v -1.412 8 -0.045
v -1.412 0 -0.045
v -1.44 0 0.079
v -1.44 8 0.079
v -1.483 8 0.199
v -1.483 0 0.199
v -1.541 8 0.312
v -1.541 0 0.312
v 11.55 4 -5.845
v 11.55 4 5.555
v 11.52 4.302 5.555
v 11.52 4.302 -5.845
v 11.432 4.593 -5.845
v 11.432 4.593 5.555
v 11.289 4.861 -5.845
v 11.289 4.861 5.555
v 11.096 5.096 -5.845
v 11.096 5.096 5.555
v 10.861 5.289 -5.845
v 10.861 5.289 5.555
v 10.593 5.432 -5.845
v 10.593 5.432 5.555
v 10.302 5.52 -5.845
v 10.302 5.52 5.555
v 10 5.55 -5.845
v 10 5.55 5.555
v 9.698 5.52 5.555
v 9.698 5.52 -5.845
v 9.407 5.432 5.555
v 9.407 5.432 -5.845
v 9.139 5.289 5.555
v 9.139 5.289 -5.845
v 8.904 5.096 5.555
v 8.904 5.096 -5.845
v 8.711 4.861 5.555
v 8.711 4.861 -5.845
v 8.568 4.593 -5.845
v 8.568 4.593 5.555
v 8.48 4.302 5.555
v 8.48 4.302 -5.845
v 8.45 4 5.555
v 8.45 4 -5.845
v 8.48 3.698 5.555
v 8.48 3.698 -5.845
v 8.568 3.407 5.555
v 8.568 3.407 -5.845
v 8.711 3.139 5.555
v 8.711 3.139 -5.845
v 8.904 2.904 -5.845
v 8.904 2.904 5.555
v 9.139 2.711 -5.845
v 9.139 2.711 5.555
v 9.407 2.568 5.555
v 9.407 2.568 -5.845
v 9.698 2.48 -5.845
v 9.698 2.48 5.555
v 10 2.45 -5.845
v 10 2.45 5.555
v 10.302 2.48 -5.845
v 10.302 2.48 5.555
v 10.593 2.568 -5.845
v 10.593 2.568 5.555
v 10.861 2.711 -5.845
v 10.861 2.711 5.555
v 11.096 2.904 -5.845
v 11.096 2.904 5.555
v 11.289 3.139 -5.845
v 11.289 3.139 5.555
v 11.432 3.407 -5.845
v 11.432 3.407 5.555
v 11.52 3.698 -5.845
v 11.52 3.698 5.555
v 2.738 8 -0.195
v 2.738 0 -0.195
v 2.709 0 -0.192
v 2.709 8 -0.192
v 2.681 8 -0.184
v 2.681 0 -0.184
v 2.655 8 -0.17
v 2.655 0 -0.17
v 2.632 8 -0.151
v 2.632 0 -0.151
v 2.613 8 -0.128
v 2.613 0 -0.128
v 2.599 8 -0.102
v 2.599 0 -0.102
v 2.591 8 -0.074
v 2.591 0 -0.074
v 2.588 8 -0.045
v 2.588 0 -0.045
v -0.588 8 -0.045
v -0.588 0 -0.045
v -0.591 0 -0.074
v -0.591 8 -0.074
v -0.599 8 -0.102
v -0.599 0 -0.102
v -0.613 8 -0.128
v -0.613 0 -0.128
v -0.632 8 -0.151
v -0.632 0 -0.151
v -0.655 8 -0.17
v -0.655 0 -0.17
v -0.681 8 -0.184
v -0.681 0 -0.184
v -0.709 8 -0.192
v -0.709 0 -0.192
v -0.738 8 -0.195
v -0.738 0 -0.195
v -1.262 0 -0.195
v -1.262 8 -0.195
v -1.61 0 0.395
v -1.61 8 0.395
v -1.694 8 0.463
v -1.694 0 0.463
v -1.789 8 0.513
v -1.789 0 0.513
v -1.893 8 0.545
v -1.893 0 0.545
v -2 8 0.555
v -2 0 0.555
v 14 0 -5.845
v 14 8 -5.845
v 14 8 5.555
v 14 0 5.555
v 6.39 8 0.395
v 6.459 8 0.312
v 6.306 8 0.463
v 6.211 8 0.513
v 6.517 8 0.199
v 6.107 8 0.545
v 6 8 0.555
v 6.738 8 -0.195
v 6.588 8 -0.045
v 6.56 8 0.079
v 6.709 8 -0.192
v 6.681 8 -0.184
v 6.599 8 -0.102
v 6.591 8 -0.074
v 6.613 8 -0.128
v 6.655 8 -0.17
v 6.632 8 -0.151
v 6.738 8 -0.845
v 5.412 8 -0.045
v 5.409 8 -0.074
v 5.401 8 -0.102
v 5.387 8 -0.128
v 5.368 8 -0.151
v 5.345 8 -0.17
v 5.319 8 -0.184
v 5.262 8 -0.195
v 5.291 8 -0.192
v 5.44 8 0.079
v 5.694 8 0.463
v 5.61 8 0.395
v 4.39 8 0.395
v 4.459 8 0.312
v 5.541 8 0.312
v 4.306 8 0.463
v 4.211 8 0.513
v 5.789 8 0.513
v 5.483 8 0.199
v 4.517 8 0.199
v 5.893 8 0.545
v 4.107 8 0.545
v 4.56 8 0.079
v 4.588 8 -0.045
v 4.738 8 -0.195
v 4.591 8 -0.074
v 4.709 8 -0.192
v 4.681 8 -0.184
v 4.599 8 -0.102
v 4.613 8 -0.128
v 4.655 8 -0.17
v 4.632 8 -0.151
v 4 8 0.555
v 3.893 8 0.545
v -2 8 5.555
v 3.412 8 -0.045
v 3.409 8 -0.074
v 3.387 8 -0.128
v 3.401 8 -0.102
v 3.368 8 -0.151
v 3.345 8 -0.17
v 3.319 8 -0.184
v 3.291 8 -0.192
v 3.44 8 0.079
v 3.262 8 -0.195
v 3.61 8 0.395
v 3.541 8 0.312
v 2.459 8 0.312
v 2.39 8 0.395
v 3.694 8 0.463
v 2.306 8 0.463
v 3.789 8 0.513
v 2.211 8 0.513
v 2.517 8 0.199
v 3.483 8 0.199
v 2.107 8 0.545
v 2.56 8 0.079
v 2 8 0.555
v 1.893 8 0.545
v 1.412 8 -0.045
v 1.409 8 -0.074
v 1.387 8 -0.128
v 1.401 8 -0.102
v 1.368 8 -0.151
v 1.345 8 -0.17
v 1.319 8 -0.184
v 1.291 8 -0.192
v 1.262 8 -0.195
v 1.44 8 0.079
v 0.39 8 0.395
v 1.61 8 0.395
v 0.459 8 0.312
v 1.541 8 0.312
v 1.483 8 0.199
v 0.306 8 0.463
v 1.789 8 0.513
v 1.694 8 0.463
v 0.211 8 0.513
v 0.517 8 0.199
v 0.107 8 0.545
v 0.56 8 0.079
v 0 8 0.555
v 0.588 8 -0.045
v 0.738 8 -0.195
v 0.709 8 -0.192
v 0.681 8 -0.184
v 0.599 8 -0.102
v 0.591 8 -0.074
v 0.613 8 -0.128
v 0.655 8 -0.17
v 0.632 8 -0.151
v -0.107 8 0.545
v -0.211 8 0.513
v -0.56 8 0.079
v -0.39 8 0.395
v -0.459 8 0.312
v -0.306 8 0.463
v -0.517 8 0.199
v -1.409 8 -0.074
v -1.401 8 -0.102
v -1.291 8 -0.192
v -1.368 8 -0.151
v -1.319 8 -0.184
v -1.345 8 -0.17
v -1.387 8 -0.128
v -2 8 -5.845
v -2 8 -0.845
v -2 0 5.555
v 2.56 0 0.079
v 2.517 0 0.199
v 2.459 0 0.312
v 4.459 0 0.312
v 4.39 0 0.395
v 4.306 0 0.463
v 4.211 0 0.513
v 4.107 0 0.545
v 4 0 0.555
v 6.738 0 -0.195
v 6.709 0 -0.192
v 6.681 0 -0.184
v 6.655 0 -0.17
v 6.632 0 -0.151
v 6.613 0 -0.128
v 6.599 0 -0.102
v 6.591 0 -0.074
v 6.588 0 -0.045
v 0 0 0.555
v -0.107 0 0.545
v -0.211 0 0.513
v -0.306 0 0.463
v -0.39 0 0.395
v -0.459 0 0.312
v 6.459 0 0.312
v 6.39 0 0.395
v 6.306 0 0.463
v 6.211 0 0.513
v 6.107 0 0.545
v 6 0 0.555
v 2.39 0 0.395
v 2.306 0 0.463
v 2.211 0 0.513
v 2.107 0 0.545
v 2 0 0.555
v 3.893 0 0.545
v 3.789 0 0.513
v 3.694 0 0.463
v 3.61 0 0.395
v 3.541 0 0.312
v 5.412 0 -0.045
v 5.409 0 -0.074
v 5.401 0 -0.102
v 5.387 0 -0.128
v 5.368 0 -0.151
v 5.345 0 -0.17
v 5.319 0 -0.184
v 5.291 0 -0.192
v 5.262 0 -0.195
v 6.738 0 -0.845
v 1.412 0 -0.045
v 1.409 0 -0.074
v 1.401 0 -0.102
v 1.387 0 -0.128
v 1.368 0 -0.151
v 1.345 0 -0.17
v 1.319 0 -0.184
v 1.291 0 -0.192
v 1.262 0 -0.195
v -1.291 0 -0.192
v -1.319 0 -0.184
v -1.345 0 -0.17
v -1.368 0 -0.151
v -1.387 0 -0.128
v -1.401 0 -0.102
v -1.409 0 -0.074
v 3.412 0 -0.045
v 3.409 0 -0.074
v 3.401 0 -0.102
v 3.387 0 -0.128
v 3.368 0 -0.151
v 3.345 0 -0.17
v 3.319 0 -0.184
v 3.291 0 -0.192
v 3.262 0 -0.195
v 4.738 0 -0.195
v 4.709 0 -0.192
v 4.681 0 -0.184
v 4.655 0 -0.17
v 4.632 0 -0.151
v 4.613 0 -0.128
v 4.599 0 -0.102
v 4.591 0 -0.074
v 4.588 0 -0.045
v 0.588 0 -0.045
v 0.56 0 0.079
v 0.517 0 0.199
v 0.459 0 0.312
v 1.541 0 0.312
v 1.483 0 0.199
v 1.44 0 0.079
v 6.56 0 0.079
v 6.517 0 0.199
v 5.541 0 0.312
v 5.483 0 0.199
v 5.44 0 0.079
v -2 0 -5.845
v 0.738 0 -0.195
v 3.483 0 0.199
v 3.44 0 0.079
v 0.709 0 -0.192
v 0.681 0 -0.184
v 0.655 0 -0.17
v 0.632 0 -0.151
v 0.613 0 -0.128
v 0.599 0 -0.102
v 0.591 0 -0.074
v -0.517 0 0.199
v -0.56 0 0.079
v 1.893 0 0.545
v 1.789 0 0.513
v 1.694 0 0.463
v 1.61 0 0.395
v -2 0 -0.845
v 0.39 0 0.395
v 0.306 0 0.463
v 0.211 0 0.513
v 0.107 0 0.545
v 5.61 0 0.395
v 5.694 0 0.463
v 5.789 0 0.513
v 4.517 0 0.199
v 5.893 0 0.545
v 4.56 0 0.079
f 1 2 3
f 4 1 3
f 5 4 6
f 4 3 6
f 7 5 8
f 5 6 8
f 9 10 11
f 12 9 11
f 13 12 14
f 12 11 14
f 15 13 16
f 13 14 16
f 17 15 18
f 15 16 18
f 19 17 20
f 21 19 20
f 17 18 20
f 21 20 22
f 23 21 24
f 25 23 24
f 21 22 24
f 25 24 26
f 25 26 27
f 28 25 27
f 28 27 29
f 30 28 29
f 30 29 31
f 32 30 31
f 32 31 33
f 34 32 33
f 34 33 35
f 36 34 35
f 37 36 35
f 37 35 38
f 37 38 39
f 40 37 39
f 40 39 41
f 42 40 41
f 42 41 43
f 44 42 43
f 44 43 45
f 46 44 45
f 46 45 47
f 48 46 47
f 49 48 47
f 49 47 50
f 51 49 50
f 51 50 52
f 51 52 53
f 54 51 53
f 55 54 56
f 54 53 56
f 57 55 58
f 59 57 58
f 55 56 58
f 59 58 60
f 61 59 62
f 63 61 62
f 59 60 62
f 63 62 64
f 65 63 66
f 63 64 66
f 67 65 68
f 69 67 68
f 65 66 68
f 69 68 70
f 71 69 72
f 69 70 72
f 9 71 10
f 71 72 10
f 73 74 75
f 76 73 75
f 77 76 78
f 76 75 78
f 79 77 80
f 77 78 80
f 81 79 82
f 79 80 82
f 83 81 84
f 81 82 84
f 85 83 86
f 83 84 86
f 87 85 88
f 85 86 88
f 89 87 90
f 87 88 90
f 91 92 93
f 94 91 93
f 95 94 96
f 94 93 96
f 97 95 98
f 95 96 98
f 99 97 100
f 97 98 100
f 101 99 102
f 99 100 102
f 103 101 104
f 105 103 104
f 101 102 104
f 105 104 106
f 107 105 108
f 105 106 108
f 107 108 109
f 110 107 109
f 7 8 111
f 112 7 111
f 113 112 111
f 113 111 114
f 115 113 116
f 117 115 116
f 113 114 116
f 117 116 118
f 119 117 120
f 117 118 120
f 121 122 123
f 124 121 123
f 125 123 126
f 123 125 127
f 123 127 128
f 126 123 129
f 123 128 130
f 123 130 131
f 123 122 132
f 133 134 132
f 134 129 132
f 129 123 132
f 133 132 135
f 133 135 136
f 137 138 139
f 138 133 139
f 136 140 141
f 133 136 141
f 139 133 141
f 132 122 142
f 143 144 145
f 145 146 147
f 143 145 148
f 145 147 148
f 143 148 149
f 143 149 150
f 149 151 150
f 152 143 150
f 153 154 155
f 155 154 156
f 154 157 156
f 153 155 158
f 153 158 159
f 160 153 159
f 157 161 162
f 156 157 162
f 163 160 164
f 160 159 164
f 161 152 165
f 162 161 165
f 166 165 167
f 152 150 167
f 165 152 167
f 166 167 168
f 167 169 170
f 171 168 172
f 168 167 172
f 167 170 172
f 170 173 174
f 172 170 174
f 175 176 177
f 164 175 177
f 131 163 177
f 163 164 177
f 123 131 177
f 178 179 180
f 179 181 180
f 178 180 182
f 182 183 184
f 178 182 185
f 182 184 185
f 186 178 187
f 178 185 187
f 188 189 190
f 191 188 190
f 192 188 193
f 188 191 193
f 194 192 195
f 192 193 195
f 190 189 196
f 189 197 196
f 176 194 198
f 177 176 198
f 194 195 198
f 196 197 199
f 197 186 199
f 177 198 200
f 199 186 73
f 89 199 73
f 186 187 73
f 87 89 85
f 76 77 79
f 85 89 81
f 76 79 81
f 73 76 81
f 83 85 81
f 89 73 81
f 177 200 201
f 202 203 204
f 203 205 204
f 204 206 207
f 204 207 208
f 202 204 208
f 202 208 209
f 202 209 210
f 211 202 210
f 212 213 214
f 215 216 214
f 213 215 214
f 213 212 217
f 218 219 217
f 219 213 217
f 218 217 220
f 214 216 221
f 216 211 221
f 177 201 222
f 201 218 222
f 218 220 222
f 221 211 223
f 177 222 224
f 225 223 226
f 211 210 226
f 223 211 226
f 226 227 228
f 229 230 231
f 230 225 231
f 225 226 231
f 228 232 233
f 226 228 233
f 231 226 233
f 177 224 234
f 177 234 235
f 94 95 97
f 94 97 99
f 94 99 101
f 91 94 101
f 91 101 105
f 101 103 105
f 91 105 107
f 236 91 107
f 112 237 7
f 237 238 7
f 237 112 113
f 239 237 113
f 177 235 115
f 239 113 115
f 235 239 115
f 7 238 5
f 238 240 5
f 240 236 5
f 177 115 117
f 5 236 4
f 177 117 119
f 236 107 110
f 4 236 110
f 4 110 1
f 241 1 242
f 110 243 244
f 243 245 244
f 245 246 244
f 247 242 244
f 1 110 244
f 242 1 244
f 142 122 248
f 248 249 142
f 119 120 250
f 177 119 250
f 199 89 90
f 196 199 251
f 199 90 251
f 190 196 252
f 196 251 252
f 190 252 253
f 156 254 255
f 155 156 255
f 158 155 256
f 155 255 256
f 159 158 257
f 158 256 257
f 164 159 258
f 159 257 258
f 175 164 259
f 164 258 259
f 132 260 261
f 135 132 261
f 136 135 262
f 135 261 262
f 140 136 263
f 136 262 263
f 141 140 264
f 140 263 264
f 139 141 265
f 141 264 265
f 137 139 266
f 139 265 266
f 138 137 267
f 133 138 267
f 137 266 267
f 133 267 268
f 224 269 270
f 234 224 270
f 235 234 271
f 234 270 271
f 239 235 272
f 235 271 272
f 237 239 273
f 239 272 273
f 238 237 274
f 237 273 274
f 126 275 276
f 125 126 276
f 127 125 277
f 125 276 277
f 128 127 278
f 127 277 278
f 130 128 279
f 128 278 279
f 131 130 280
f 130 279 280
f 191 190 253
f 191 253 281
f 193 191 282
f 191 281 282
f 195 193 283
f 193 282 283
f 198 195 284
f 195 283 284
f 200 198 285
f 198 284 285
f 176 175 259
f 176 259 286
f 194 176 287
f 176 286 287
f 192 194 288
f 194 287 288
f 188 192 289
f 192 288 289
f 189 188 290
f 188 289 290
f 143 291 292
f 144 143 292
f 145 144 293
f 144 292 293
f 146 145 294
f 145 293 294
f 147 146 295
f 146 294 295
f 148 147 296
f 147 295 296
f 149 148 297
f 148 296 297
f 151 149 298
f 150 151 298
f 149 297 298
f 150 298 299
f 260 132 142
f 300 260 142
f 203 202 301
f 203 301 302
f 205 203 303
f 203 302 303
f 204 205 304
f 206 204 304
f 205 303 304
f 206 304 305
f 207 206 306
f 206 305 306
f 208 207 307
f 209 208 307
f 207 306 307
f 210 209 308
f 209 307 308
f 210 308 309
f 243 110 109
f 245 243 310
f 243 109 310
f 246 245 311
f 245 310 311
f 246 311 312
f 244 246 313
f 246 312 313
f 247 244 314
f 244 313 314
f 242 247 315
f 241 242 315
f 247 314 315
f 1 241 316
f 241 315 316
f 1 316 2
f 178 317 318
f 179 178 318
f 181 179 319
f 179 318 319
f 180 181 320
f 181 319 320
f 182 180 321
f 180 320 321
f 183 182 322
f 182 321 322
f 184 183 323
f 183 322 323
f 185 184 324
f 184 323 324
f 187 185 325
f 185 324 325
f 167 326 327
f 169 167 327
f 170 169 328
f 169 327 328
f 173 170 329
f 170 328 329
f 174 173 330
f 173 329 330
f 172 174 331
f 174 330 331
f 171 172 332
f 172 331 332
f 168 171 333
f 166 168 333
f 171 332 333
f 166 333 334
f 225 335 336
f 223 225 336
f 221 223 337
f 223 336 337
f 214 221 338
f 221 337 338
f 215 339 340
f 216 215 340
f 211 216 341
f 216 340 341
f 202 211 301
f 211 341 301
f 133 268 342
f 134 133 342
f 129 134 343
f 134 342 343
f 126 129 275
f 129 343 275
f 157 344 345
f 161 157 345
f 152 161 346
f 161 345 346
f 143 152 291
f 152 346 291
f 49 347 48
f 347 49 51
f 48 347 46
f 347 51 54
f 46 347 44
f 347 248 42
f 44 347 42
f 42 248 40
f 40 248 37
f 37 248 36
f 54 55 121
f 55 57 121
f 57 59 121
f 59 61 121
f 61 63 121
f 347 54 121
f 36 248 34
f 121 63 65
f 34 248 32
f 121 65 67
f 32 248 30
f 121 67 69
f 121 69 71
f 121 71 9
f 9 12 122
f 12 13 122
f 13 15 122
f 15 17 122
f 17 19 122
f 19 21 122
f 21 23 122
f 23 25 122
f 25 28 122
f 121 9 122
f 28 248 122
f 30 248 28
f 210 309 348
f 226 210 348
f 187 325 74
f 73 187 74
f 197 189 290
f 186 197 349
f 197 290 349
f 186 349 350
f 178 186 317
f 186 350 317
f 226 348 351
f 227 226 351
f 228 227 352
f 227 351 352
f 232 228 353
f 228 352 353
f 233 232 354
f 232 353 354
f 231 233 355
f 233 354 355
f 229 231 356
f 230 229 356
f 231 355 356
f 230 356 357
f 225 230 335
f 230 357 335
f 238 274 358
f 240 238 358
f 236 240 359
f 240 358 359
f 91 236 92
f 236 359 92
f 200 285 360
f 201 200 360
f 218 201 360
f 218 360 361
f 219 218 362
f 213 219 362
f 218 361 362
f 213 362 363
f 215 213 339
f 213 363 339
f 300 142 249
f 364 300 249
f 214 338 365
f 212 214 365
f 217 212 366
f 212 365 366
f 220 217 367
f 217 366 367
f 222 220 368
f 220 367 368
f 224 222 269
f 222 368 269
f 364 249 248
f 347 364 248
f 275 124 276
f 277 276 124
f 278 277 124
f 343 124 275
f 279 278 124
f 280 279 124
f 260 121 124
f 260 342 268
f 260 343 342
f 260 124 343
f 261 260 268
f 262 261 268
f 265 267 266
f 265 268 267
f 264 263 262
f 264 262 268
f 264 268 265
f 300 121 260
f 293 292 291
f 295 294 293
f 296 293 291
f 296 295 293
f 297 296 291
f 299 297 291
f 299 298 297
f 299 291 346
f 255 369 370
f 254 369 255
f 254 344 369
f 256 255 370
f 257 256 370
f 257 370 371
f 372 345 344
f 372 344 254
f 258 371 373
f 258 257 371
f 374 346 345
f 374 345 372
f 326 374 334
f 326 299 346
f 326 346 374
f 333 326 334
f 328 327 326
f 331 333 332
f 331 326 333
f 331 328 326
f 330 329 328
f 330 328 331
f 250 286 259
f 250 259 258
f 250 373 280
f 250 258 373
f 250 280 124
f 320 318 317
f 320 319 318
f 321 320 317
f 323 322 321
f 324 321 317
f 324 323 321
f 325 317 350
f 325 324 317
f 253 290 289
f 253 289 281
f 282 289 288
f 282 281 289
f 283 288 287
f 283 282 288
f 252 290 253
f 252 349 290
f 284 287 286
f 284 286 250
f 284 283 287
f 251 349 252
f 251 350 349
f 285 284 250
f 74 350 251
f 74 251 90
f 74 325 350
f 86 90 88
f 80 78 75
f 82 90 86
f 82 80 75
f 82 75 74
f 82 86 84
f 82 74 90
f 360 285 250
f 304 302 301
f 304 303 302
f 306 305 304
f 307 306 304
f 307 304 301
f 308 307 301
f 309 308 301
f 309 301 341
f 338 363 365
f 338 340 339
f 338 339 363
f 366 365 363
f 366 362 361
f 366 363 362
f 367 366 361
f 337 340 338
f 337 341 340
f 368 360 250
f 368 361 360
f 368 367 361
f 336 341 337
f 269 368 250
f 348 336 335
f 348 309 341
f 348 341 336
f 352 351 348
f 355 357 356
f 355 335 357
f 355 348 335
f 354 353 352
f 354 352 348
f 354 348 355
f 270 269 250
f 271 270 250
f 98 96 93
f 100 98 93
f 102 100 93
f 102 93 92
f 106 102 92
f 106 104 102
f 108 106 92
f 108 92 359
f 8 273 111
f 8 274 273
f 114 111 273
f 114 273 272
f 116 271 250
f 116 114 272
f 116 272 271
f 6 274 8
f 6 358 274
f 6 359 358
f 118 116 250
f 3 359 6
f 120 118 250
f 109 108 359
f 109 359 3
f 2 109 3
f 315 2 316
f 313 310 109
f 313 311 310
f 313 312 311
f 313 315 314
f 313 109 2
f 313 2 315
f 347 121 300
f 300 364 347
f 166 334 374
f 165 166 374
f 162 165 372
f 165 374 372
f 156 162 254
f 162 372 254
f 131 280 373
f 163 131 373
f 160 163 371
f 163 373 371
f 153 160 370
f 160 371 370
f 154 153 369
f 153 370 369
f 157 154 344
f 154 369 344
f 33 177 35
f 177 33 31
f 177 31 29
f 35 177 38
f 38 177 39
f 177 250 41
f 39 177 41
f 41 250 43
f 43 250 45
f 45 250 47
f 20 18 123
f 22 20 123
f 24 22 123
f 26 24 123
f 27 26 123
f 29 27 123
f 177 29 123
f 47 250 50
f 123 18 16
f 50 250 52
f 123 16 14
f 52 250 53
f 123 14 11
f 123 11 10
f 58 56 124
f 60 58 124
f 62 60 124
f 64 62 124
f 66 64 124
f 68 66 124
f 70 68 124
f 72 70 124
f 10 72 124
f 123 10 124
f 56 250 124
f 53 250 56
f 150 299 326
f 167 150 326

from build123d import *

# Parameters (mm, degrees)
BOSS_EXTRUDE1_DEPTH = 8
SKETCH3_W           = 7
SKETCH3_H           = 0.75
BOSS_EXTRUDE2_DEPTH = 8
BOSS_EXTRUDE3_DEPTH = 8
CUT_EXTRUDE1_REACH  = 21.747
SKETCH2_R           = 1.55


with BuildPart() as part:
    # Sketch1 → Boss-Extrude1 (new body)
    with BuildSketch(Plane(origin=(0, 0, 0), x_dir=(1, 0, 0), z_dir=(0, 1, 0))):
        with BuildLine():
            Line((-0.73791447, 0.195), (-1.26208553, 0.195))
            ThreePointArc((-1.26208553, 0.195), (-1.368151547, 0.151066017), (-1.41208553, 0.045))
            ThreePointArc((-1.41208553, 0.045), (-1.459490829, -0.139768303), (-1.541118048, -0.312173597))
            ThreePointArc((-1.541118048, -0.312173597), (-1.740415087, -0.490551397), (-2, -0.555))
            Line((-2, -0.555), (-2, -5.555))
            Line((-2, -5.555), (14, -5.555))
            Line((14, -5.555), (14, -0.555))
            ThreePointArc((14, -0.555), (13.740415087, -0.490551397), (13.541118048, -0.312173597))
            ThreePointArc((13.541118048, -0.312173597), (13.459490829, -0.139768303), (13.41208553, 0.045))
            ThreePointArc((13.41208553, 0.045), (13.368151547, 0.151066017), (13.26208553, 0.195))
            Line((13.26208553, 0.195), (12.73791447, 0.195))
            ThreePointArc((12.73791447, 0.195), (12.631848453, 0.151066017), (12.58791447, 0.045))
            ThreePointArc((12.58791447, 0.045), (12.540509171, -0.139768303), (12.458881952, -0.312173597))
            ThreePointArc((12.458881952, -0.312173597), (12.259584913, -0.490551397), (12, -0.555))
            ThreePointArc((12, -0.555), (11.740415087, -0.490551397), (11.541118048, -0.312173597))
            ThreePointArc((11.541118048, -0.312173597), (11.459490829, -0.139768303), (11.41208553, 0.045))
            ThreePointArc((11.41208553, 0.045), (11.368151547, 0.151066017), (11.26208553, 0.195))
            Line((11.26208553, 0.195), (10.73791447, 0.195))
            ThreePointArc((10.73791447, 0.195), (10.631848453, 0.151066017), (10.58791447, 0.045))
            ThreePointArc((10.58791447, 0.045), (10.540509171, -0.139768303), (10.458881952, -0.312173597))
            ThreePointArc((10.458881952, -0.312173597), (10.259584913, -0.490551397), (10, -0.555))
            ThreePointArc((10, -0.555), (9.740415087, -0.490551397), (9.541118048, -0.312173597))
            ThreePointArc((9.541118048, -0.312173597), (9.459490829, -0.139768303), (9.41208553, 0.045))
            ThreePointArc((9.41208553, 0.045), (9.368151547, 0.151066017), (9.26208553, 0.195))
            Line((9.26208553, 0.195), (8.73791447, 0.195))
            ThreePointArc((8.73791447, 0.195), (8.631848453, 0.151066017), (8.58791447, 0.045))
            ThreePointArc((8.58791447, 0.045), (8.540509171, -0.139768303), (8.458881952, -0.312173597))
            ThreePointArc((8.458881952, -0.312173597), (8.259584913, -0.490551397), (8, -0.555))
            ThreePointArc((8, -0.555), (7.740415087, -0.490551397), (7.541118048, -0.312173597))
            ThreePointArc((7.541118048, -0.312173597), (7.459490829, -0.139768303), (7.41208553, 0.045))
            ThreePointArc((7.41208553, 0.045), (7.368151547, 0.151066017), (7.26208553, 0.195))
            Line((7.26208553, 0.195), (6.73791447, 0.195))
            ThreePointArc((6.73791447, 0.195), (6.631848453, 0.151066017), (6.58791447, 0.045))
            ThreePointArc((6.58791447, 0.045), (6.540509171, -0.139768303), (6.458881952, -0.312173597))
            ThreePointArc((6.458881952, -0.312173597), (6.259584913, -0.490551397), (6, -0.555))
            ThreePointArc((6, -0.555), (5.740415087, -0.490551397), (5.541118048, -0.312173597))
            ThreePointArc((5.541118048, -0.312173597), (5.459490829, -0.139768303), (5.41208553, 0.045))
            ThreePointArc((5.41208553, 0.045), (5.368151547, 0.151066017), (5.26208553, 0.195))
            Line((5.26208553, 0.195), (4.73791447, 0.195))
            ThreePointArc((4.73791447, 0.195), (4.631848453, 0.151066017), (4.58791447, 0.045))
            ThreePointArc((4.58791447, 0.045), (4.540509171, -0.139768303), (4.458881952, -0.312173597))
            ThreePointArc((4.458881952, -0.312173597), (4.259584913, -0.490551397), (4, -0.555))
            ThreePointArc((4, -0.555), (3.740415087, -0.490551397), (3.541118048, -0.312173597))
            ThreePointArc((3.541118048, -0.312173597), (3.459490829, -0.139768303), (3.41208553, 0.045))
            ThreePointArc((3.41208553, 0.045), (3.368151547, 0.151066017), (3.26208553, 0.195))
            Line((3.26208553, 0.195), (2.73791447, 0.195))
            ThreePointArc((2.73791447, 0.195), (2.631848453, 0.151066017), (2.58791447, 0.045))
            ThreePointArc((2.58791447, 0.045), (2.540509171, -0.139768303), (2.458881952, -0.312173597))
            ThreePointArc((2.458881952, -0.312173597), (2.259584913, -0.490551397), (2, -0.555))
            ThreePointArc((2, -0.555), (1.740415087, -0.490551397), (1.541118048, -0.312173597))
            ThreePointArc((1.541118048, -0.312173597), (1.459490829, -0.139768303), (1.41208553, 0.045))
            ThreePointArc((1.41208553, 0.045), (1.368151547, 0.151066017), (1.26208553, 0.195))
            Line((1.26208553, 0.195), (0.73791447, 0.195))
            ThreePointArc((0.73791447, 0.195), (0.631848453, 0.151066017), (0.58791447, 0.045))
            ThreePointArc((0.58791447, 0.045), (0.540509171, -0.139768303), (0.458881952, -0.312173597))
            ThreePointArc((0.458881952, -0.312173597), (0.259584913, -0.490551397), (0, -0.555))
            ThreePointArc((0, -0.555), (-0.259584913, -0.490551397), (-0.458881952, -0.312173597))
            ThreePointArc((-0.458881952, -0.312173597), (-0.540509171, -0.139768303), (-0.58791447, 0.045))
            ThreePointArc((-0.58791447, 0.045), (-0.631848453, 0.151066017), (-0.73791447, 0.195))
        make_face()
    extrude(amount=BOSS_EXTRUDE1_DEPTH)

    # Sketch3 → Boss-Extrude2 (add)
    with BuildSketch(Plane(origin=(0, 8, 0), x_dir=(1, 0, 0), z_dir=(0, 1, 0))):
        with Locations((10.5, -0.18)):
            Rectangle(SKETCH3_W, SKETCH3_H)
    extrude(amount=-BOSS_EXTRUDE2_DEPTH)

    # Sketch4 → Boss-Extrude3 (add)
    with BuildSketch(Plane(origin=(0, 8, 0), x_dir=(1, 0, 0), z_dir=(0, 1, 0))):
        Polygon((6.73791447, 0.195), (6.73791447, 0.845), (-2, 0.845), (-2, 5.845), (14, 5.845), (14, 0.195), align=None)
    extrude(amount=-BOSS_EXTRUDE3_DEPTH)

    # Sketch2 → Cut-Extrude1 (cut, up to next)
    with BuildSketch(Plane.XY.offset(5.555), mode=Mode.PRIVATE) as cut_extrude1_sk1:
        with Locations((10, 4)):
            Circle(SKETCH2_R)
    cut_extrude1_tool1 = extrude(cut_extrude1_sk1.sketch, amount=-CUT_EXTRUDE1_REACH, mode=Mode.PRIVATE) & part.part
    add(cut_extrude1_tool1.solids().sort_by_distance((10, 4, 5.555))[0], mode=Mode.SUBTRACT)


solid = part.part
